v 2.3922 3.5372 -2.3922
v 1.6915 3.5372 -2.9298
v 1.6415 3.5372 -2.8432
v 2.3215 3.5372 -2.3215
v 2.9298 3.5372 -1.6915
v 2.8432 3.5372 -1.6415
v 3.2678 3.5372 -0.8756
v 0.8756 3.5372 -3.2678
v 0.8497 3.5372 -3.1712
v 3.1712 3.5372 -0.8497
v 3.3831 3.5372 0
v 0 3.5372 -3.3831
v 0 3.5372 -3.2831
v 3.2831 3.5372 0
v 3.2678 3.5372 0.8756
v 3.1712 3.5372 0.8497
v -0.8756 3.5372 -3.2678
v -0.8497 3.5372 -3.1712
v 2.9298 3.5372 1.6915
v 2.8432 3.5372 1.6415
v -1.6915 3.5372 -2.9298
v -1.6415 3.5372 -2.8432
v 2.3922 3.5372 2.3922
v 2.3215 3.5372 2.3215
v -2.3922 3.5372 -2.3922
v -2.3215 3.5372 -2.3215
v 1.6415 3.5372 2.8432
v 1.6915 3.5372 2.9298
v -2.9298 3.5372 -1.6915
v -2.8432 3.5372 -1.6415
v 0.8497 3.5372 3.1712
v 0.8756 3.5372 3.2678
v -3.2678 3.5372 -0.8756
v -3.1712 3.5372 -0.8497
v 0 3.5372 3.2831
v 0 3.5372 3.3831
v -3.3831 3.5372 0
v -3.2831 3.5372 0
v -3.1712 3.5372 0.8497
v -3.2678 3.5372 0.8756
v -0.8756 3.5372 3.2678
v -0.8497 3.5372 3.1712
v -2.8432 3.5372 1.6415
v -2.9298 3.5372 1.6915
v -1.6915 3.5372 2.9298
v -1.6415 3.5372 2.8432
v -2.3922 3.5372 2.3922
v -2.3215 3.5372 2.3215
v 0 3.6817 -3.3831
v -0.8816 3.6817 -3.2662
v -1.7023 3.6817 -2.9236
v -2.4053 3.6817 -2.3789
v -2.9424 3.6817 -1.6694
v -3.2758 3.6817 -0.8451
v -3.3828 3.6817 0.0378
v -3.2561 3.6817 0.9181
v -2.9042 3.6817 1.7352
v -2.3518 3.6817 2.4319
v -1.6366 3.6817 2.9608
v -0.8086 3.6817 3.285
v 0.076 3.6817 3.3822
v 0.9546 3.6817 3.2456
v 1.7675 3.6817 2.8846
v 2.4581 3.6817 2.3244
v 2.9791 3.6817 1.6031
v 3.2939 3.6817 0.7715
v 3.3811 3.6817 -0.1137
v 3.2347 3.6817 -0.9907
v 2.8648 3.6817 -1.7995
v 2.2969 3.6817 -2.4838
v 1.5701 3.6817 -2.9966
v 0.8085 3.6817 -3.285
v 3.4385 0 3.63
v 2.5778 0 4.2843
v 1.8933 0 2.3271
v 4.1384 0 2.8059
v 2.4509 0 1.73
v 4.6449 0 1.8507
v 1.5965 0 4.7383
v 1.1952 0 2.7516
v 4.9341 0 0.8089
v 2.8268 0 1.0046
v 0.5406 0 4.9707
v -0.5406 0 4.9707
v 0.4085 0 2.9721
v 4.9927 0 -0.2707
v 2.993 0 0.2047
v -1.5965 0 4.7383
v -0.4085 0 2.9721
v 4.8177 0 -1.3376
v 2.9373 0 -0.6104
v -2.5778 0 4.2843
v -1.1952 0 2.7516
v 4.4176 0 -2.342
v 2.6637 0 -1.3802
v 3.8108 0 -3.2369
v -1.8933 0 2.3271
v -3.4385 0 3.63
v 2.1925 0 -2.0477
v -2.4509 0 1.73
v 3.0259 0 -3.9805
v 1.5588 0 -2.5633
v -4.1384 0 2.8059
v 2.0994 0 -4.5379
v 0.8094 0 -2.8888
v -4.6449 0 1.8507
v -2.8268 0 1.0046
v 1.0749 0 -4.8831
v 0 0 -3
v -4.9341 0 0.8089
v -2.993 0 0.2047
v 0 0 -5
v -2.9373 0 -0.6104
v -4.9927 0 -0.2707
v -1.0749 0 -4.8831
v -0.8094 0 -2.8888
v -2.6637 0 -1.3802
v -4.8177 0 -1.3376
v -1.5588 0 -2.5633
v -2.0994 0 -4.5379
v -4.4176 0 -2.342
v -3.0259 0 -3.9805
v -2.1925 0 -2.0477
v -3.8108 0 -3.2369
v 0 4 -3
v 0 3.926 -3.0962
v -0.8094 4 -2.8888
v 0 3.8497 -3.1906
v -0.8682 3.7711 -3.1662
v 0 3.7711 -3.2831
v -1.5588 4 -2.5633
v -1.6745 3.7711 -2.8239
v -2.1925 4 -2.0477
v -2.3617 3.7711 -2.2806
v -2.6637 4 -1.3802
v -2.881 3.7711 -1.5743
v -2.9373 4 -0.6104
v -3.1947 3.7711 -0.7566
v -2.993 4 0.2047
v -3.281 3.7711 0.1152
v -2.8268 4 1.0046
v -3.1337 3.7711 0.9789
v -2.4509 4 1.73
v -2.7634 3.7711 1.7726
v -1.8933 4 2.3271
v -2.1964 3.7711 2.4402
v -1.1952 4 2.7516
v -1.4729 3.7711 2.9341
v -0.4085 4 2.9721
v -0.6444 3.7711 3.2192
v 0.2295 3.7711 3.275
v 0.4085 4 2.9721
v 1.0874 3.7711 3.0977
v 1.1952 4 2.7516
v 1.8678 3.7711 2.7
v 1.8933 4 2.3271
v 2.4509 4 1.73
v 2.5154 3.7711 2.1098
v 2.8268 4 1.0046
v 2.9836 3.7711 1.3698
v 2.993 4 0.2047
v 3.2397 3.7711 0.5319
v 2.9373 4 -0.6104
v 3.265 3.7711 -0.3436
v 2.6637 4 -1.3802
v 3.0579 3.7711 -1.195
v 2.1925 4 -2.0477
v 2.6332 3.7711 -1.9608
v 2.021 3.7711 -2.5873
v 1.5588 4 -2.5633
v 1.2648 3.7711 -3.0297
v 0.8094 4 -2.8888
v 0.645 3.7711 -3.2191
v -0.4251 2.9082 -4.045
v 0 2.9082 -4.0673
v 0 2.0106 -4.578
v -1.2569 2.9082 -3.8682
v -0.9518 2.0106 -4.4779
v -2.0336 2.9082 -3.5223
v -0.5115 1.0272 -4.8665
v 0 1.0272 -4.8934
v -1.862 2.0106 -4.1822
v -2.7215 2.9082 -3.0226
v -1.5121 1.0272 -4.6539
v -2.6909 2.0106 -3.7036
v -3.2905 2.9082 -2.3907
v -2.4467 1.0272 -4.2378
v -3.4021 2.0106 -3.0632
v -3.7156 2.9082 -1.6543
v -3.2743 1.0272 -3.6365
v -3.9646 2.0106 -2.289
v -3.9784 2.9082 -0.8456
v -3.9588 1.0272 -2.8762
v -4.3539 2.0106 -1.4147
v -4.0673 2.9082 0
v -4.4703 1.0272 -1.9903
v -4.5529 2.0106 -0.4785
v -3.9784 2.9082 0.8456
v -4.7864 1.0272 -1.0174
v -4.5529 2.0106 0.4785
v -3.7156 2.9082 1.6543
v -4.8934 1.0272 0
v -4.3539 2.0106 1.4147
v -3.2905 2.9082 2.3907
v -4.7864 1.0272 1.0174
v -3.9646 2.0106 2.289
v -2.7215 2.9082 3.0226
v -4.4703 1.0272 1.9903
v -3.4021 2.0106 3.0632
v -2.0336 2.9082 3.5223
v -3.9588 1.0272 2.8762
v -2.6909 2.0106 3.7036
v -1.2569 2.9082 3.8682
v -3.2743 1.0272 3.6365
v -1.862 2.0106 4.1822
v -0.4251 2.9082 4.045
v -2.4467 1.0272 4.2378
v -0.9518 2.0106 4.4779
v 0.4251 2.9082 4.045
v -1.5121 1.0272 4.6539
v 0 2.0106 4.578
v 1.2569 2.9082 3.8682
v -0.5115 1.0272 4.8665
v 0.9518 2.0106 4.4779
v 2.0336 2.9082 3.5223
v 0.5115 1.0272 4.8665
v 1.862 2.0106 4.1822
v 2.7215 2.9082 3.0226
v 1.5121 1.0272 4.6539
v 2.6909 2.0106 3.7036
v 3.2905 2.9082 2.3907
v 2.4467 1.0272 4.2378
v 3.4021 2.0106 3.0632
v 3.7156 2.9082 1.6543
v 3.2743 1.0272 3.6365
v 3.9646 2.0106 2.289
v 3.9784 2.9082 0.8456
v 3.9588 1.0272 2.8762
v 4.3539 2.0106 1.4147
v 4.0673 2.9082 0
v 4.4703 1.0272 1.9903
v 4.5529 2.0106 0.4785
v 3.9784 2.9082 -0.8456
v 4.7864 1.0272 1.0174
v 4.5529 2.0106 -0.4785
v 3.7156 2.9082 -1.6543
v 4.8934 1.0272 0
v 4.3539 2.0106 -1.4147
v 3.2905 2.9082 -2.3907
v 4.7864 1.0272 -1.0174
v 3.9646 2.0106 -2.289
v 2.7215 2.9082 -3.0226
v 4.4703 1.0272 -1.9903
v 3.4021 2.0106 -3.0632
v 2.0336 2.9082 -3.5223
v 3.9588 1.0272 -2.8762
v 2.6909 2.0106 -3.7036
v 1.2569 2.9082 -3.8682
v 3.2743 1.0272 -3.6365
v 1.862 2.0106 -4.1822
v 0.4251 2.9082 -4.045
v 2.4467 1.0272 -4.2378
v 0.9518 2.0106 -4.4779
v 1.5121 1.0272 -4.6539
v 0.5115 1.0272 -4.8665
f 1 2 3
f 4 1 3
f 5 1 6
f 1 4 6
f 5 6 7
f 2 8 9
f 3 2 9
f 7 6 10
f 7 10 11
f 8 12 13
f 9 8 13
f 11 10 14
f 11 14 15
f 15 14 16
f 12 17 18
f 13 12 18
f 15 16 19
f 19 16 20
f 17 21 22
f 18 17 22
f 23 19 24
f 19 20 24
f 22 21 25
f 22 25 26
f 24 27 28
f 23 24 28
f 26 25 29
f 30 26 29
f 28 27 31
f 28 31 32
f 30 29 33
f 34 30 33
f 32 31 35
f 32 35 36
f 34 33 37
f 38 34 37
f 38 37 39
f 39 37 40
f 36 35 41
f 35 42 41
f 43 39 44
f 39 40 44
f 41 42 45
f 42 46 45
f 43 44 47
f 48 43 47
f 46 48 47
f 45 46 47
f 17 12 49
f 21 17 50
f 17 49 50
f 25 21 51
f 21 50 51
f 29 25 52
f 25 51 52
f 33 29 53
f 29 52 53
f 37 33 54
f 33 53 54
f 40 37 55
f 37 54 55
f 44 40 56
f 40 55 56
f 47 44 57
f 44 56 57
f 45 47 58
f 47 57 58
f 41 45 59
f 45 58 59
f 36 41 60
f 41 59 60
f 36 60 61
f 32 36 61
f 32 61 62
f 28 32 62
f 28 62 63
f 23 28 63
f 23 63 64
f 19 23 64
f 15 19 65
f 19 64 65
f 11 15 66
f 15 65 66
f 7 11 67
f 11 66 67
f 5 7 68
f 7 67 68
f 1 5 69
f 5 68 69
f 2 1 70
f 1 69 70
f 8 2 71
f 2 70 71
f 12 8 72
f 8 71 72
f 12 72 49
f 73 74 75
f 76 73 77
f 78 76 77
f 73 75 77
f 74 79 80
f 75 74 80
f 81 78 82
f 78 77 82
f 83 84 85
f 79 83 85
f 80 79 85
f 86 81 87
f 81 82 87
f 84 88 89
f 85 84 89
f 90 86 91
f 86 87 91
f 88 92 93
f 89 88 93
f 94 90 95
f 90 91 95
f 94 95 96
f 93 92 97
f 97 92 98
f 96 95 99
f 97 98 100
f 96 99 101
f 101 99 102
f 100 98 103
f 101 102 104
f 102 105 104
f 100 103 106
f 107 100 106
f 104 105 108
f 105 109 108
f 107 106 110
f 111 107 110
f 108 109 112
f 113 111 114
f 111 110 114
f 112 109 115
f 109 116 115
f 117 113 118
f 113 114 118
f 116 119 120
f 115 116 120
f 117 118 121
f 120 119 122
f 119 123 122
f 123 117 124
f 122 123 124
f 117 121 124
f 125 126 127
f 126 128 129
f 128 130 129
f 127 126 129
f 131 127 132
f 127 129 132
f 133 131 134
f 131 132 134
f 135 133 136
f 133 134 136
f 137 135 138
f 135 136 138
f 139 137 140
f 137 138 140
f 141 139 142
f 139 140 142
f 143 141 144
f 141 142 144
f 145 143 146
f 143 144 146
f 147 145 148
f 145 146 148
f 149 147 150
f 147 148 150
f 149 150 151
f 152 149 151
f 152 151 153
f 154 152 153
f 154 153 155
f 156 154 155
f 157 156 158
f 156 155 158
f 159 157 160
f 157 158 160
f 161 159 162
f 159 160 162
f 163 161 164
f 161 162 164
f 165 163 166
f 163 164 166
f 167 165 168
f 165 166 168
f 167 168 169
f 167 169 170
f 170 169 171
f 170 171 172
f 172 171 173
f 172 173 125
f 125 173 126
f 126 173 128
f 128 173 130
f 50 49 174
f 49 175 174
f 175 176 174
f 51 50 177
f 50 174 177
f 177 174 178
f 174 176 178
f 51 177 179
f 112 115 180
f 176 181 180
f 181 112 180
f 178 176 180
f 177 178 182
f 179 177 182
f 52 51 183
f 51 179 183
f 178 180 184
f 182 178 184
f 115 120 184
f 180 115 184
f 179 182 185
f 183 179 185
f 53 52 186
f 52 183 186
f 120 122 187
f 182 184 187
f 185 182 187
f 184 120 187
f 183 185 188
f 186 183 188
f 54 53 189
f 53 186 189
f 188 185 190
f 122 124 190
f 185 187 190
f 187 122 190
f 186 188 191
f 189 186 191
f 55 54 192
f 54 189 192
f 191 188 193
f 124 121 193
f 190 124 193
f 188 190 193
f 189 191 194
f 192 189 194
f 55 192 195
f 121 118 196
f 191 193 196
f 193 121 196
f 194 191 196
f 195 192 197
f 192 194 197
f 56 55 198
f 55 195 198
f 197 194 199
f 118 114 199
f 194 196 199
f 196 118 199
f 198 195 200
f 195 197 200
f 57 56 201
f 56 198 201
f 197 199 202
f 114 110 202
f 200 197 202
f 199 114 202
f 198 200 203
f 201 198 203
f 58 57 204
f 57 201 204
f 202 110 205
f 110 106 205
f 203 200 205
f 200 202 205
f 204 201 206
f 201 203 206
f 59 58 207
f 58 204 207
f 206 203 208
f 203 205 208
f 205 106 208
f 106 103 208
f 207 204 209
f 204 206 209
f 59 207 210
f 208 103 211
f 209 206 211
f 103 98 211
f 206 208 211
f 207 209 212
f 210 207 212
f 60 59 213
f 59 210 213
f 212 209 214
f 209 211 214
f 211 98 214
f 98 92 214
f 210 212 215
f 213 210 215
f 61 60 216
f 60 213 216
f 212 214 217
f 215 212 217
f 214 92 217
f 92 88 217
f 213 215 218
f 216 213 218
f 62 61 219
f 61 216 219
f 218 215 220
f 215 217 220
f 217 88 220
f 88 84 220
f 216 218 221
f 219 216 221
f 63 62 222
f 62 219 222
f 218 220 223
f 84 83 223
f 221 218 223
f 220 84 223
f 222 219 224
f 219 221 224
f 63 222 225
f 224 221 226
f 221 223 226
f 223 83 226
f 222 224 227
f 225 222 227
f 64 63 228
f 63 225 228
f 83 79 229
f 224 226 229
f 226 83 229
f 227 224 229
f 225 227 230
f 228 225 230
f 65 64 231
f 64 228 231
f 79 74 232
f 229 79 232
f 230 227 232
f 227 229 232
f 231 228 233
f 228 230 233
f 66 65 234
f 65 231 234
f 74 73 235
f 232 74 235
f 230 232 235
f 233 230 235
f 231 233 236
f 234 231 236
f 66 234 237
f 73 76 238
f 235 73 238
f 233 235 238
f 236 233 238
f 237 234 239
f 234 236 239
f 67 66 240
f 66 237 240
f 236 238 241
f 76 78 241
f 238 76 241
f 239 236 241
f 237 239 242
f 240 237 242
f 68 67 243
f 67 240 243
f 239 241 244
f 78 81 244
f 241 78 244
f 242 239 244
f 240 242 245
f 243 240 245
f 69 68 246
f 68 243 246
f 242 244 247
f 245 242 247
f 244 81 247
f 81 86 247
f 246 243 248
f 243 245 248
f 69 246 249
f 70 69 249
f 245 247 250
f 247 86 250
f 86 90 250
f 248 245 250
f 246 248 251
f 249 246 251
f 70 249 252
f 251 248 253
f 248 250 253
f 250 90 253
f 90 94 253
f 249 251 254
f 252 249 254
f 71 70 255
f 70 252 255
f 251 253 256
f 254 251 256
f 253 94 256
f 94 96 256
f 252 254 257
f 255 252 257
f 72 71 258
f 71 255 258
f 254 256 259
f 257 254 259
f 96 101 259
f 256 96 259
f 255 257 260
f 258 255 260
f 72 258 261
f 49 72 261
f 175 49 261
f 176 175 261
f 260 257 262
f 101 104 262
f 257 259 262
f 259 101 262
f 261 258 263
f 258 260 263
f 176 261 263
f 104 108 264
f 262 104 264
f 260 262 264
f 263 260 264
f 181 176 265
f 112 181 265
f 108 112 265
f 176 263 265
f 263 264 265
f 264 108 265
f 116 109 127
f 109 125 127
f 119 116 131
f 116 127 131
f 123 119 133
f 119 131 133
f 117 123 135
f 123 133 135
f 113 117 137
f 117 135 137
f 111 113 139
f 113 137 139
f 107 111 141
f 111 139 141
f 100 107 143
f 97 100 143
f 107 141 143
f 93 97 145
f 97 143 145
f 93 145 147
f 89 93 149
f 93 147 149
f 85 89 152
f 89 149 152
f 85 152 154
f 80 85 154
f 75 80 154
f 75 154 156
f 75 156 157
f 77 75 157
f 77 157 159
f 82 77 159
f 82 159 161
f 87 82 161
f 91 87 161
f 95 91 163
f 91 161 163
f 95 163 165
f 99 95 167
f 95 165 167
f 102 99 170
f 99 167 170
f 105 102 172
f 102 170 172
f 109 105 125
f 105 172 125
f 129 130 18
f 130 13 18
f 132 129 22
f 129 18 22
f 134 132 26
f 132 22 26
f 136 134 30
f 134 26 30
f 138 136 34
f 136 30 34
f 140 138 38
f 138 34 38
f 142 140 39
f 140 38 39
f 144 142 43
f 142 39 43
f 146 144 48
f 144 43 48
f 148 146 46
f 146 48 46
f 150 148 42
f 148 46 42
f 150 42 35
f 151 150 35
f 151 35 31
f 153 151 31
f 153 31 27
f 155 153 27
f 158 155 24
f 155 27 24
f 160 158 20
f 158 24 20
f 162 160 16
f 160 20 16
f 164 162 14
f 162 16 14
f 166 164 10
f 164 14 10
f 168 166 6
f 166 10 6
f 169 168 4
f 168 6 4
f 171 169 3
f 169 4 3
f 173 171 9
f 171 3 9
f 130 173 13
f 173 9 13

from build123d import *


with BuildPart() as part:
    # Sketch1 → Revolve1 (revolve)
    with BuildSketch(Plane.XY, mode=Mode.PRIVATE) as revolve1_sk:
        with BuildLine():
            Line((3, 0), (3, 4))
            ThreePointArc((3, 4), (4.472135955, 2.236067977), (5, 0))
            Line((5, 0), (3, 0))
        make_face()
    revolve(revolve1_sk.sketch.rotate(Axis((0, 0, 0), (0, 1, 0)), 90), axis=Axis((0, 0, 0), (0, 1, 0)))

    # Sketch2 → Cut-Revolve1 (revolve, cut)
    with BuildSketch(Plane(origin=(0, 0, 0), x_dir=(0, 0, -1), z_dir=(1, 0, 0))):
        Polygon((3.283055217, 3.771146834), (3.283055217, 3.53723963), (3.383055217, 3.53723963), (3.383055217, 3.783827608), (3.383055217, 3.915367926), (3.283055217, 3.915367926), align=None)
    revolve(axis=Axis((0, 0, 0), (0, 1, 0)), mode=Mode.SUBTRACT)


solid = part.part
